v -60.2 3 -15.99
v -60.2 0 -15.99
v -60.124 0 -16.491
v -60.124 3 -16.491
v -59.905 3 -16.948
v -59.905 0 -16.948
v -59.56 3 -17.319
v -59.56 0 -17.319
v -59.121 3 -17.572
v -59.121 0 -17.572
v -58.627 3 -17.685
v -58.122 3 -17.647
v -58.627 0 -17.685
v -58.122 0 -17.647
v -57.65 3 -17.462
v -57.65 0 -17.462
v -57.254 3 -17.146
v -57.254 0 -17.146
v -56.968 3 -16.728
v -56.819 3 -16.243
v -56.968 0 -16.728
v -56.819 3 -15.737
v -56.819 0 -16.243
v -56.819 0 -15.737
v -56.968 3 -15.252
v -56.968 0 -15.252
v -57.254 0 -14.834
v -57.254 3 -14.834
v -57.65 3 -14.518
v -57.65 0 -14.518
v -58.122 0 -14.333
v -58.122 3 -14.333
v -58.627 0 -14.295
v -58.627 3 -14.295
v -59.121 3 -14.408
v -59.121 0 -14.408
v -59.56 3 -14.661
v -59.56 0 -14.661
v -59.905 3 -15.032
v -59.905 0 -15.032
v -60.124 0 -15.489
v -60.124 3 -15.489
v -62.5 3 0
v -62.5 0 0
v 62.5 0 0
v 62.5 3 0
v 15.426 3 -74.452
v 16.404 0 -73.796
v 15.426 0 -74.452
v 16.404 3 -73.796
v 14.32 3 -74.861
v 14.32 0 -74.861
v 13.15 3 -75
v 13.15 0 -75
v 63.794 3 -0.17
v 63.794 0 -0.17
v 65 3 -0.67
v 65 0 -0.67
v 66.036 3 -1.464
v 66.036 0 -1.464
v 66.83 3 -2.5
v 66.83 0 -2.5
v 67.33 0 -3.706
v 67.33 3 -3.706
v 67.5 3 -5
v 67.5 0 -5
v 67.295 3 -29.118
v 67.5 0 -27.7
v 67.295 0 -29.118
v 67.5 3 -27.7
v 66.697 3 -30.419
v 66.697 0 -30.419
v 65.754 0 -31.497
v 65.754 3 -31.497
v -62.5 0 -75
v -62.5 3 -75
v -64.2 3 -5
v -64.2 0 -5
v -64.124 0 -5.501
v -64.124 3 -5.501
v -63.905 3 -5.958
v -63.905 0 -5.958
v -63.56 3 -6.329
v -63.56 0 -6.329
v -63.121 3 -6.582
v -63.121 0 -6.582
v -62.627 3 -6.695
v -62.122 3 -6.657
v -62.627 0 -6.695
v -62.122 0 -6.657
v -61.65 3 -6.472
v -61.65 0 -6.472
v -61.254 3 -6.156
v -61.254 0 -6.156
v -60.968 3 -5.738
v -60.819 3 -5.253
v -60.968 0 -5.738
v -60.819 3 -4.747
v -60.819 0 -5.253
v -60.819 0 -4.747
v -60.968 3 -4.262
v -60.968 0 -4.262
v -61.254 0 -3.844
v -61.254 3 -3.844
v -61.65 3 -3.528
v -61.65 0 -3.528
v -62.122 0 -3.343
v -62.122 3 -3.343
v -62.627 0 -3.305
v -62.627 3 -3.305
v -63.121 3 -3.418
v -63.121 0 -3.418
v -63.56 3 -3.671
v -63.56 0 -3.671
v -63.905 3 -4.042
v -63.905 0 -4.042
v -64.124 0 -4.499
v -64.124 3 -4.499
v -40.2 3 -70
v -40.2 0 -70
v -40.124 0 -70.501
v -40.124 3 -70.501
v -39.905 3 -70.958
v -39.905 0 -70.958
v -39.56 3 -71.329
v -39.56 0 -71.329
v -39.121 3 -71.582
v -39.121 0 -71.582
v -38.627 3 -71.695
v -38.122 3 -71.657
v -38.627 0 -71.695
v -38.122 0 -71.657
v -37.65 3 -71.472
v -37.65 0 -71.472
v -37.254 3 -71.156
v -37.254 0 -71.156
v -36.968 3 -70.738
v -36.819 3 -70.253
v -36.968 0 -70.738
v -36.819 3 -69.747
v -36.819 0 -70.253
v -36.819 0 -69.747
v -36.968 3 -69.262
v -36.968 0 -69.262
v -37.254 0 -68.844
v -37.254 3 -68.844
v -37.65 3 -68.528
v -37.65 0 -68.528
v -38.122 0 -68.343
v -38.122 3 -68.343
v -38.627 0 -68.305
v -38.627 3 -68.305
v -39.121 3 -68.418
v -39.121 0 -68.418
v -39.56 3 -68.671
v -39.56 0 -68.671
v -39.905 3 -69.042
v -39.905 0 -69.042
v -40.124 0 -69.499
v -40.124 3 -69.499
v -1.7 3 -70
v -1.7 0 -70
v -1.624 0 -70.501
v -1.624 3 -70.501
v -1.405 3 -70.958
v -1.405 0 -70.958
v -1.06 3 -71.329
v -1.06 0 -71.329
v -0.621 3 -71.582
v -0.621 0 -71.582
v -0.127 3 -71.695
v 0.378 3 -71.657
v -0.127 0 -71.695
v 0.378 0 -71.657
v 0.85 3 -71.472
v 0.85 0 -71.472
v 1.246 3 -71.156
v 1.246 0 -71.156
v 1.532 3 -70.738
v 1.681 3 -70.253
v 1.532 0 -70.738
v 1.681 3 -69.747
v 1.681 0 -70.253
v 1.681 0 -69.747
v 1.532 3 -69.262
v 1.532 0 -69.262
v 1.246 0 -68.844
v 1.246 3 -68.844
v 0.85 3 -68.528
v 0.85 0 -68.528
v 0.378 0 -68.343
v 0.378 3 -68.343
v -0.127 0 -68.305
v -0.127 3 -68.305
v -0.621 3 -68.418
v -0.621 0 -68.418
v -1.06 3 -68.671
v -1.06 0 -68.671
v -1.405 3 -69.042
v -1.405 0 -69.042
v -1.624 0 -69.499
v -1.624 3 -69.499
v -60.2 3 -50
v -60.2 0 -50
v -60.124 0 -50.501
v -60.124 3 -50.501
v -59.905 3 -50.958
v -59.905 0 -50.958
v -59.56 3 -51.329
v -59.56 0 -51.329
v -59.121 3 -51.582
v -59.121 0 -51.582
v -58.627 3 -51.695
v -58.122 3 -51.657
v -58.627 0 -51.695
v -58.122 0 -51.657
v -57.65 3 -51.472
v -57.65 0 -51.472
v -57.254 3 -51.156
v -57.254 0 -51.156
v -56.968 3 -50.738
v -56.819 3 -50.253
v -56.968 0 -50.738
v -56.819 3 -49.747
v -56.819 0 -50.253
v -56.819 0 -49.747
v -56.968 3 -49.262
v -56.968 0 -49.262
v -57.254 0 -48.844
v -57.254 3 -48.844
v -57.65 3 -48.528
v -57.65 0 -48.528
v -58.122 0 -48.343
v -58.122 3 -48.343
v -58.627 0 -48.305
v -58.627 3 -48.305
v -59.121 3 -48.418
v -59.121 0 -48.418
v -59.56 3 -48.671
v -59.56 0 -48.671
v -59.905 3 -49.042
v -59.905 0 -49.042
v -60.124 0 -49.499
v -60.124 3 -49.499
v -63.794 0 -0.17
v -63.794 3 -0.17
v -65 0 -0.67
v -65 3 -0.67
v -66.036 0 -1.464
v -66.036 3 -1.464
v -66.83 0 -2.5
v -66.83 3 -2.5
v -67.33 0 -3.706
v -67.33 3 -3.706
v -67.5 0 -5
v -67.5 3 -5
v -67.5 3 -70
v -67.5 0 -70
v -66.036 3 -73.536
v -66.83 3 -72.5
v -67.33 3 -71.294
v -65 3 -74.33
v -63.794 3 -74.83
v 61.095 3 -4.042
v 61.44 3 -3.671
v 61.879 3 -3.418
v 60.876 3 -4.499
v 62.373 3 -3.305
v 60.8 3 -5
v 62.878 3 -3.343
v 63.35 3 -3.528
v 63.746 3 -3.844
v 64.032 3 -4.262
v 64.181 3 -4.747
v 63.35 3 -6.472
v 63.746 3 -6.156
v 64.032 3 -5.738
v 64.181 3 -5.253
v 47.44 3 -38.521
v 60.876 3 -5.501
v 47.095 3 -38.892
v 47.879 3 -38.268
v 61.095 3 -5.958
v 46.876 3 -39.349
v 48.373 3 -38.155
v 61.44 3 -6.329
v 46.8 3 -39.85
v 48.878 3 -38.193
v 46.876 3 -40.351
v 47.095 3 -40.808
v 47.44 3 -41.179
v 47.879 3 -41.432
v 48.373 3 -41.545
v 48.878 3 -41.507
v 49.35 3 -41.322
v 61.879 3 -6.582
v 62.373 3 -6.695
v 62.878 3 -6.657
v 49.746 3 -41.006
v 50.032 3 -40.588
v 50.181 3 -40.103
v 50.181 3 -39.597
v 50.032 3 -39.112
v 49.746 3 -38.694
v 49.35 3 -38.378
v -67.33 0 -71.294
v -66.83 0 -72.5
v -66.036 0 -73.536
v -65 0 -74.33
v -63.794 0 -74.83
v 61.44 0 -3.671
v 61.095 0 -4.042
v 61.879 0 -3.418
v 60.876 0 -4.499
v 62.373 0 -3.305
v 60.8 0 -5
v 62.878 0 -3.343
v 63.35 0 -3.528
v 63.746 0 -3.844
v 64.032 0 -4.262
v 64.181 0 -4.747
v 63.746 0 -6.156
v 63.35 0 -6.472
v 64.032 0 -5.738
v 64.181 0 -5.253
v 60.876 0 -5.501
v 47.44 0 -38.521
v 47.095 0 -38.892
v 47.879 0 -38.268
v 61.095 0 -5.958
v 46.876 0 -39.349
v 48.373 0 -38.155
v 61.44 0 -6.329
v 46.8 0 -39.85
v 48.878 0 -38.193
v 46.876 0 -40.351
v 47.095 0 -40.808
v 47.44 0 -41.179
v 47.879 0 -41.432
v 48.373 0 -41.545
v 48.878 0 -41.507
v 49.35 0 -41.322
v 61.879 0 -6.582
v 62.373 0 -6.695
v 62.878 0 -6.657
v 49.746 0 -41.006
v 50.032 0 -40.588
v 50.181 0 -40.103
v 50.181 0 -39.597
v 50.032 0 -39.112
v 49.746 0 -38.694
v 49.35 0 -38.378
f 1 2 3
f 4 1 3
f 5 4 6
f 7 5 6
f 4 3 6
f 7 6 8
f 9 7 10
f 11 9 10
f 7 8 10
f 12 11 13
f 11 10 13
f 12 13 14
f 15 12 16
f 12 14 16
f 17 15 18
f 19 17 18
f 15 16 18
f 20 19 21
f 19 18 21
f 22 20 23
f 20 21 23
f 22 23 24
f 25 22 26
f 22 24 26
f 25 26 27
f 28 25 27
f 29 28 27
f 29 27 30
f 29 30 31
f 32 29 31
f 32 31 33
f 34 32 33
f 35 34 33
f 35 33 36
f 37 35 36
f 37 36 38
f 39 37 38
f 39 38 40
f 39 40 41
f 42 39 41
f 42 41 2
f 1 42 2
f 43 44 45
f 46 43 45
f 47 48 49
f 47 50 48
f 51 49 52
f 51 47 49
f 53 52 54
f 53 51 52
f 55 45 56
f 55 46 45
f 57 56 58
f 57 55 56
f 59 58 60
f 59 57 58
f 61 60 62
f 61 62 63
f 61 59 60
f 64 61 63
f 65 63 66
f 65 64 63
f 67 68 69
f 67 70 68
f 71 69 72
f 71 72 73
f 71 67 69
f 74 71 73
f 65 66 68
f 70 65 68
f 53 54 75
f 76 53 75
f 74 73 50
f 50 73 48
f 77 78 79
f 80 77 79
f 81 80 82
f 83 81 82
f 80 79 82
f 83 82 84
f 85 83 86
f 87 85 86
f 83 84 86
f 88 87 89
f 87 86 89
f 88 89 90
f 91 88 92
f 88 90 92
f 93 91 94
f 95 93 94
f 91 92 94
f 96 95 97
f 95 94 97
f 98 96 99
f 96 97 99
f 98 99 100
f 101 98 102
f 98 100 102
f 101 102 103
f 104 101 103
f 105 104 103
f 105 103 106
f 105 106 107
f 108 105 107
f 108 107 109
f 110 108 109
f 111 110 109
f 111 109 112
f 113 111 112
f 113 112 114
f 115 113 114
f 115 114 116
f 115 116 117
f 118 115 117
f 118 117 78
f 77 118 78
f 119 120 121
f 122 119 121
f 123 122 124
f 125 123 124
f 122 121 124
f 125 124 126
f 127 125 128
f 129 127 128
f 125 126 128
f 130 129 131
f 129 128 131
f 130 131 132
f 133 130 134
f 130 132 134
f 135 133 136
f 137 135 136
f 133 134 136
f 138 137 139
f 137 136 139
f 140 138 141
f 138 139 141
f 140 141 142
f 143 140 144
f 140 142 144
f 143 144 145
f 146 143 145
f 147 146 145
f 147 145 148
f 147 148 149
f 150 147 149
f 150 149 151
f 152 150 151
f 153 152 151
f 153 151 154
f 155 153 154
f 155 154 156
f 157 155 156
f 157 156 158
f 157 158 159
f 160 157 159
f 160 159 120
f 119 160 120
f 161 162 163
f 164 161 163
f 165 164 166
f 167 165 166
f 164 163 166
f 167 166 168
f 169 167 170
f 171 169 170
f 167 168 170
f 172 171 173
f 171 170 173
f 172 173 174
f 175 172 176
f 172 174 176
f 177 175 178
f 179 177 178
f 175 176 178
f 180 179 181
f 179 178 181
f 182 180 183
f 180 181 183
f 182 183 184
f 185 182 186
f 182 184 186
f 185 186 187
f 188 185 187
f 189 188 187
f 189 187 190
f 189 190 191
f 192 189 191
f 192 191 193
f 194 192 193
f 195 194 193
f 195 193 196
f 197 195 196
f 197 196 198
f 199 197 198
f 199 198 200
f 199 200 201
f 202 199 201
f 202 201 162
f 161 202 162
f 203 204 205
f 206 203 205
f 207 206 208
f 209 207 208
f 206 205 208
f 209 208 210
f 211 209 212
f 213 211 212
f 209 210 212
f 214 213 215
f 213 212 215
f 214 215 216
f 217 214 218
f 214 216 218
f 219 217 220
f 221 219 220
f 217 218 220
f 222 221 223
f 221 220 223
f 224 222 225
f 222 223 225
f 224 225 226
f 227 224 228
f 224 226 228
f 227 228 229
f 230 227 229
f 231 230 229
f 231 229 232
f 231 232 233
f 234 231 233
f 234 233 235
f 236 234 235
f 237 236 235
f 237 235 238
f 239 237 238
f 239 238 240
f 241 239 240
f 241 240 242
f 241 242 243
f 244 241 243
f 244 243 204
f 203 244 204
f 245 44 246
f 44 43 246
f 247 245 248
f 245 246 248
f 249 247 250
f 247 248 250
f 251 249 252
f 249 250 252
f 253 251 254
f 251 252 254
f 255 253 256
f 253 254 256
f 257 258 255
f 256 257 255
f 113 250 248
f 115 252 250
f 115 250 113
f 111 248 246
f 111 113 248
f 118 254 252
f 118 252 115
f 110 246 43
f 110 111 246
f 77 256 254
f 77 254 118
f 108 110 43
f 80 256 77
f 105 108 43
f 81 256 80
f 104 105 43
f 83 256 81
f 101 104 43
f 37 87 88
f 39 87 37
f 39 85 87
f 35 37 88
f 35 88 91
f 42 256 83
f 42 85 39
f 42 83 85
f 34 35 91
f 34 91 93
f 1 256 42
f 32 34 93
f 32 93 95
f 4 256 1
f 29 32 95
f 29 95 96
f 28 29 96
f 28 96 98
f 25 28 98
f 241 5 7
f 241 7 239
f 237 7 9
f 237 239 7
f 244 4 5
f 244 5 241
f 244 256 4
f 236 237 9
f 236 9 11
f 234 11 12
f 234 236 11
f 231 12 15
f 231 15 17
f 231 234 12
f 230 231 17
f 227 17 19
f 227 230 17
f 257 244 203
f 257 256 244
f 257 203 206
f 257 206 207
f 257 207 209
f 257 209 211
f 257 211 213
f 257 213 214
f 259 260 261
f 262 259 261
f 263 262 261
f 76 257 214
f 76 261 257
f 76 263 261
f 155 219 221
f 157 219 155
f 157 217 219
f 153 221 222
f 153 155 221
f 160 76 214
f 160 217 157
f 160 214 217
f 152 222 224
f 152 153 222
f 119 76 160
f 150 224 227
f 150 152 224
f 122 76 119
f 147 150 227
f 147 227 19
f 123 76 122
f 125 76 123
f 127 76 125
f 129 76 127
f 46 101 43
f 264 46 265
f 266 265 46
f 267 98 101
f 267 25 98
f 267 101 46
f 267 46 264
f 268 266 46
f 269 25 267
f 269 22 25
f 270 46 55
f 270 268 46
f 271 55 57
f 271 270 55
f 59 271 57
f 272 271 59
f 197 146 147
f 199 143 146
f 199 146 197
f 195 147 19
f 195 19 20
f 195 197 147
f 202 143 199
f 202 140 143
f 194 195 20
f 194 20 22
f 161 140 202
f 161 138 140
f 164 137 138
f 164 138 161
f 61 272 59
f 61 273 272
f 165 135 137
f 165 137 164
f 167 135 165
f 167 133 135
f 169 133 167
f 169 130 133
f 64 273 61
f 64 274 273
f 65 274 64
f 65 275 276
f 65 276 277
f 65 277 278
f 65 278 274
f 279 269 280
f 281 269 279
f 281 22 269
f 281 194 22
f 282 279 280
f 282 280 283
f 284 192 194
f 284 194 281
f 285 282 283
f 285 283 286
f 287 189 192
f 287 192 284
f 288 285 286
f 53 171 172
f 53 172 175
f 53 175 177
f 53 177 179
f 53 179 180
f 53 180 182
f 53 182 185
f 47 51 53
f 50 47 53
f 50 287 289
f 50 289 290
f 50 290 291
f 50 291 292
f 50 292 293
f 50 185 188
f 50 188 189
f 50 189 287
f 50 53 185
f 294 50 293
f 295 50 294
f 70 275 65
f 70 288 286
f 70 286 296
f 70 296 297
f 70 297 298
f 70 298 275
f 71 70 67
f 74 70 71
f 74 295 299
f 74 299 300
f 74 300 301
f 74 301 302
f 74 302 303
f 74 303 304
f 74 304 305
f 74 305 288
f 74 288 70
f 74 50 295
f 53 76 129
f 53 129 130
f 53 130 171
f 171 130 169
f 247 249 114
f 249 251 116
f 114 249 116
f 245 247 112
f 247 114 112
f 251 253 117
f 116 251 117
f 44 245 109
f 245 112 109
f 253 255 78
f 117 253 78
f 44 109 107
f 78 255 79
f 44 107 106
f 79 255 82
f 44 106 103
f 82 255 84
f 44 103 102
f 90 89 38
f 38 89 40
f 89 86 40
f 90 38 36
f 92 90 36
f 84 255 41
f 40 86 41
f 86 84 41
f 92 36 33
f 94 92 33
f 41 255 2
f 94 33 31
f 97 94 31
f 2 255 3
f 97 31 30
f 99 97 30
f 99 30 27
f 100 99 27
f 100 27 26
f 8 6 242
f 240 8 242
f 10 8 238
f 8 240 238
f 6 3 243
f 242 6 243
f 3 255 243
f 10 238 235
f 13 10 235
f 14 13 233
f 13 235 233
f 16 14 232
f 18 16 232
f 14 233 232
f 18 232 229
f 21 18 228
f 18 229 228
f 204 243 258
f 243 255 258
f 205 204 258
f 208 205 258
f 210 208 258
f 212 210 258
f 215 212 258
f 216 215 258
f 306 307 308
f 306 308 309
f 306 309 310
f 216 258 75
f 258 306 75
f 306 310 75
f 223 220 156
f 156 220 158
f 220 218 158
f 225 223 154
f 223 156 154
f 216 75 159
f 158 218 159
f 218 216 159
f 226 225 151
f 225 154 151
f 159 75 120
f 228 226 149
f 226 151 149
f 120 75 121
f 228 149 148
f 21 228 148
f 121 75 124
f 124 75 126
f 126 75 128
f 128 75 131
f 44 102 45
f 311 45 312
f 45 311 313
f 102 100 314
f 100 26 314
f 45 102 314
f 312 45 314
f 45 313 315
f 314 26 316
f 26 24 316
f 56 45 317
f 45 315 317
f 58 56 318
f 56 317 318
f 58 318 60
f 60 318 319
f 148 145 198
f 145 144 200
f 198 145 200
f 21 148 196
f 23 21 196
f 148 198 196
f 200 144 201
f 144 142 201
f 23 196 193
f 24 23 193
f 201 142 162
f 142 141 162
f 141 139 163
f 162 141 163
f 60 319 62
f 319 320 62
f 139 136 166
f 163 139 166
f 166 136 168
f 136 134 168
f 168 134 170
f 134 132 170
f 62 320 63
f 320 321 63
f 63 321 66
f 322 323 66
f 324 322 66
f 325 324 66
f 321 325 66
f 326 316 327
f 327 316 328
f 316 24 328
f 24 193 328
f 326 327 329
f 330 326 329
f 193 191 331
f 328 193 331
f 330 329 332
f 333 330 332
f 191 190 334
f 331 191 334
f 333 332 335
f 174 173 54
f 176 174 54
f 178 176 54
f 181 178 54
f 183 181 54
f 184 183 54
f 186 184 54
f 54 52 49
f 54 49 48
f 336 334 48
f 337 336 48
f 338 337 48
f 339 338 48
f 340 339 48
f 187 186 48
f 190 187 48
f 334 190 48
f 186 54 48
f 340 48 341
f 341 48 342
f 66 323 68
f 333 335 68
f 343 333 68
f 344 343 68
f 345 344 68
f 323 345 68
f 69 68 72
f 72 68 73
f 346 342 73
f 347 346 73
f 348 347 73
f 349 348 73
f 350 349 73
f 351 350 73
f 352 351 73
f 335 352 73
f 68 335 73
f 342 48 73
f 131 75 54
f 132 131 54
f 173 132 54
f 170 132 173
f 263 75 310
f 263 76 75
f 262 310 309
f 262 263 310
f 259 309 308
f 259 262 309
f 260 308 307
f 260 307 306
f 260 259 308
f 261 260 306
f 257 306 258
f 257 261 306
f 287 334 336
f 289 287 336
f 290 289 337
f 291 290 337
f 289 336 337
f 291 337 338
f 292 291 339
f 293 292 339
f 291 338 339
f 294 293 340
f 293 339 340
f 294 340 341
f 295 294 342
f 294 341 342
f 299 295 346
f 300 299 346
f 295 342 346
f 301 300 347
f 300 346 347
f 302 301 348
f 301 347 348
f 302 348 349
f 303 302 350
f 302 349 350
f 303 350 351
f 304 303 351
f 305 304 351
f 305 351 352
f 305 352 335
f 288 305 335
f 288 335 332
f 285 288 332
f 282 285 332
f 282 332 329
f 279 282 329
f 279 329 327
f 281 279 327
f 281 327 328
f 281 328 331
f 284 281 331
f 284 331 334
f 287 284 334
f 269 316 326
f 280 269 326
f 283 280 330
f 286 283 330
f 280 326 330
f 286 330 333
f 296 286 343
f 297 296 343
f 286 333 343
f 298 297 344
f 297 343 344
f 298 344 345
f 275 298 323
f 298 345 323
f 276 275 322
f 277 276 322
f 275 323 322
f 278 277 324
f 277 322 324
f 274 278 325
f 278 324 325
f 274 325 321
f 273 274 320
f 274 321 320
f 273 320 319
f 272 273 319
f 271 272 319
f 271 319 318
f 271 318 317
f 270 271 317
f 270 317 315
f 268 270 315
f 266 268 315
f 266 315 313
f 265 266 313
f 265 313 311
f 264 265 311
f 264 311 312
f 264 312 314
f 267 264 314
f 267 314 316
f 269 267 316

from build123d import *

# Parameters (mm, degrees)
BOSS_EXTRU_1_DEPTH      = 3
CONG_1_R                = 5
ESQUISSE2_R             = 1
ESQUISSE2_R_2           = 1.5
ENL_V_MAT_EXTRU_2_DEPTH = 3
D_GAGEMENT_M31_D        = 3.4
D_GAGEMENT_M31_DEPTH    = 10
D_GAGEMENT_M31_TIP      = 1.021463052


with BuildPart() as part:
    # Esquisse1 → Boss.-Extru.1 (new body)
    with BuildSketch(Plane(origin=(0, 0, 0), x_dir=(1, 0, 0), z_dir=(0, 1, 0))):
        Polygon((-67.5, 0), (67.5, 0), (67.5, 30), (15, 75), (-15, 75), (-67.5, 75), (-67.5, 30), align=None)
    extrude(amount=BOSS_EXTRU_1_DEPTH)

    # Congé1
    cong_1_edges = [part.edges().sort_by_distance(p)[0] for p in [
        (67.5, 1.5, 0),
        (-67.5, 1.5, 0),
        (-67.5, 1.5, -75),
        (15, 1.5, -75),
        (67.5, 1.5, -30),
    ]]
    fillet(cong_1_edges, radius=CONG_1_R)

    # Esquisse2 → Enlèv. mat.-Extru.2 (cut)
    with BuildSketch(Plane(origin=(0, 3, 0), x_dir=(1, 0, 0), z_dir=(0, 1, 0))):
        with Locations(Location((-62.5, 5, 0), (0, 0, 270))):
            Circle(ESQUISSE2_R)
        with Locations(Location((62.5, 5, 0), (0, 0, 270))):
            Circle(ESQUISSE2_R)
        with Locations(Location((0, 70, 0), (0, 0, 270))):
            Circle(ESQUISSE2_R)
        with Locations(Location((-58.5, 15.99, 0), (0, 0, 270))):
            Circle(ESQUISSE2_R_2)
        with Locations(Location((-58.5, 50, 0), (0, 0, 270))):
            Circle(ESQUISSE2_R_2)
        with Locations(Location((-38.5, 70, 0), (0, 0, 270))):
            Circle(ESQUISSE2_R_2)
        with Locations(Location((48.5, 39.85, 0), (0, 0, 270))):
            Circle(ESQUISSE2_R_2)
    extrude(amount=-ENL_V_MAT_EXTRU_2_DEPTH, mode=Mode.SUBTRACT)

    # Dégagement M31
    with Locations(Plane(origin=(0, 3, 0), x_dir=(1, 0, 0), z_dir=(0, 1, 0))):
        with Locations((-62.5, 5), (62.5, 5), (0, 70), (-58.5, 15.99), (-58.5, 50), (-38.5, 70), (48.5, 39.85)):
            Hole(D_GAGEMENT_M31_D / 2, depth=D_GAGEMENT_M31_DEPTH)
            with Locations((0, 0, -(D_GAGEMENT_M31_DEPTH + D_GAGEMENT_M31_TIP / 2))):  # 118° drill point
                Cone(0, D_GAGEMENT_M31_D / 2, D_GAGEMENT_M31_TIP, mode=Mode.SUBTRACT)


solid = part.part
